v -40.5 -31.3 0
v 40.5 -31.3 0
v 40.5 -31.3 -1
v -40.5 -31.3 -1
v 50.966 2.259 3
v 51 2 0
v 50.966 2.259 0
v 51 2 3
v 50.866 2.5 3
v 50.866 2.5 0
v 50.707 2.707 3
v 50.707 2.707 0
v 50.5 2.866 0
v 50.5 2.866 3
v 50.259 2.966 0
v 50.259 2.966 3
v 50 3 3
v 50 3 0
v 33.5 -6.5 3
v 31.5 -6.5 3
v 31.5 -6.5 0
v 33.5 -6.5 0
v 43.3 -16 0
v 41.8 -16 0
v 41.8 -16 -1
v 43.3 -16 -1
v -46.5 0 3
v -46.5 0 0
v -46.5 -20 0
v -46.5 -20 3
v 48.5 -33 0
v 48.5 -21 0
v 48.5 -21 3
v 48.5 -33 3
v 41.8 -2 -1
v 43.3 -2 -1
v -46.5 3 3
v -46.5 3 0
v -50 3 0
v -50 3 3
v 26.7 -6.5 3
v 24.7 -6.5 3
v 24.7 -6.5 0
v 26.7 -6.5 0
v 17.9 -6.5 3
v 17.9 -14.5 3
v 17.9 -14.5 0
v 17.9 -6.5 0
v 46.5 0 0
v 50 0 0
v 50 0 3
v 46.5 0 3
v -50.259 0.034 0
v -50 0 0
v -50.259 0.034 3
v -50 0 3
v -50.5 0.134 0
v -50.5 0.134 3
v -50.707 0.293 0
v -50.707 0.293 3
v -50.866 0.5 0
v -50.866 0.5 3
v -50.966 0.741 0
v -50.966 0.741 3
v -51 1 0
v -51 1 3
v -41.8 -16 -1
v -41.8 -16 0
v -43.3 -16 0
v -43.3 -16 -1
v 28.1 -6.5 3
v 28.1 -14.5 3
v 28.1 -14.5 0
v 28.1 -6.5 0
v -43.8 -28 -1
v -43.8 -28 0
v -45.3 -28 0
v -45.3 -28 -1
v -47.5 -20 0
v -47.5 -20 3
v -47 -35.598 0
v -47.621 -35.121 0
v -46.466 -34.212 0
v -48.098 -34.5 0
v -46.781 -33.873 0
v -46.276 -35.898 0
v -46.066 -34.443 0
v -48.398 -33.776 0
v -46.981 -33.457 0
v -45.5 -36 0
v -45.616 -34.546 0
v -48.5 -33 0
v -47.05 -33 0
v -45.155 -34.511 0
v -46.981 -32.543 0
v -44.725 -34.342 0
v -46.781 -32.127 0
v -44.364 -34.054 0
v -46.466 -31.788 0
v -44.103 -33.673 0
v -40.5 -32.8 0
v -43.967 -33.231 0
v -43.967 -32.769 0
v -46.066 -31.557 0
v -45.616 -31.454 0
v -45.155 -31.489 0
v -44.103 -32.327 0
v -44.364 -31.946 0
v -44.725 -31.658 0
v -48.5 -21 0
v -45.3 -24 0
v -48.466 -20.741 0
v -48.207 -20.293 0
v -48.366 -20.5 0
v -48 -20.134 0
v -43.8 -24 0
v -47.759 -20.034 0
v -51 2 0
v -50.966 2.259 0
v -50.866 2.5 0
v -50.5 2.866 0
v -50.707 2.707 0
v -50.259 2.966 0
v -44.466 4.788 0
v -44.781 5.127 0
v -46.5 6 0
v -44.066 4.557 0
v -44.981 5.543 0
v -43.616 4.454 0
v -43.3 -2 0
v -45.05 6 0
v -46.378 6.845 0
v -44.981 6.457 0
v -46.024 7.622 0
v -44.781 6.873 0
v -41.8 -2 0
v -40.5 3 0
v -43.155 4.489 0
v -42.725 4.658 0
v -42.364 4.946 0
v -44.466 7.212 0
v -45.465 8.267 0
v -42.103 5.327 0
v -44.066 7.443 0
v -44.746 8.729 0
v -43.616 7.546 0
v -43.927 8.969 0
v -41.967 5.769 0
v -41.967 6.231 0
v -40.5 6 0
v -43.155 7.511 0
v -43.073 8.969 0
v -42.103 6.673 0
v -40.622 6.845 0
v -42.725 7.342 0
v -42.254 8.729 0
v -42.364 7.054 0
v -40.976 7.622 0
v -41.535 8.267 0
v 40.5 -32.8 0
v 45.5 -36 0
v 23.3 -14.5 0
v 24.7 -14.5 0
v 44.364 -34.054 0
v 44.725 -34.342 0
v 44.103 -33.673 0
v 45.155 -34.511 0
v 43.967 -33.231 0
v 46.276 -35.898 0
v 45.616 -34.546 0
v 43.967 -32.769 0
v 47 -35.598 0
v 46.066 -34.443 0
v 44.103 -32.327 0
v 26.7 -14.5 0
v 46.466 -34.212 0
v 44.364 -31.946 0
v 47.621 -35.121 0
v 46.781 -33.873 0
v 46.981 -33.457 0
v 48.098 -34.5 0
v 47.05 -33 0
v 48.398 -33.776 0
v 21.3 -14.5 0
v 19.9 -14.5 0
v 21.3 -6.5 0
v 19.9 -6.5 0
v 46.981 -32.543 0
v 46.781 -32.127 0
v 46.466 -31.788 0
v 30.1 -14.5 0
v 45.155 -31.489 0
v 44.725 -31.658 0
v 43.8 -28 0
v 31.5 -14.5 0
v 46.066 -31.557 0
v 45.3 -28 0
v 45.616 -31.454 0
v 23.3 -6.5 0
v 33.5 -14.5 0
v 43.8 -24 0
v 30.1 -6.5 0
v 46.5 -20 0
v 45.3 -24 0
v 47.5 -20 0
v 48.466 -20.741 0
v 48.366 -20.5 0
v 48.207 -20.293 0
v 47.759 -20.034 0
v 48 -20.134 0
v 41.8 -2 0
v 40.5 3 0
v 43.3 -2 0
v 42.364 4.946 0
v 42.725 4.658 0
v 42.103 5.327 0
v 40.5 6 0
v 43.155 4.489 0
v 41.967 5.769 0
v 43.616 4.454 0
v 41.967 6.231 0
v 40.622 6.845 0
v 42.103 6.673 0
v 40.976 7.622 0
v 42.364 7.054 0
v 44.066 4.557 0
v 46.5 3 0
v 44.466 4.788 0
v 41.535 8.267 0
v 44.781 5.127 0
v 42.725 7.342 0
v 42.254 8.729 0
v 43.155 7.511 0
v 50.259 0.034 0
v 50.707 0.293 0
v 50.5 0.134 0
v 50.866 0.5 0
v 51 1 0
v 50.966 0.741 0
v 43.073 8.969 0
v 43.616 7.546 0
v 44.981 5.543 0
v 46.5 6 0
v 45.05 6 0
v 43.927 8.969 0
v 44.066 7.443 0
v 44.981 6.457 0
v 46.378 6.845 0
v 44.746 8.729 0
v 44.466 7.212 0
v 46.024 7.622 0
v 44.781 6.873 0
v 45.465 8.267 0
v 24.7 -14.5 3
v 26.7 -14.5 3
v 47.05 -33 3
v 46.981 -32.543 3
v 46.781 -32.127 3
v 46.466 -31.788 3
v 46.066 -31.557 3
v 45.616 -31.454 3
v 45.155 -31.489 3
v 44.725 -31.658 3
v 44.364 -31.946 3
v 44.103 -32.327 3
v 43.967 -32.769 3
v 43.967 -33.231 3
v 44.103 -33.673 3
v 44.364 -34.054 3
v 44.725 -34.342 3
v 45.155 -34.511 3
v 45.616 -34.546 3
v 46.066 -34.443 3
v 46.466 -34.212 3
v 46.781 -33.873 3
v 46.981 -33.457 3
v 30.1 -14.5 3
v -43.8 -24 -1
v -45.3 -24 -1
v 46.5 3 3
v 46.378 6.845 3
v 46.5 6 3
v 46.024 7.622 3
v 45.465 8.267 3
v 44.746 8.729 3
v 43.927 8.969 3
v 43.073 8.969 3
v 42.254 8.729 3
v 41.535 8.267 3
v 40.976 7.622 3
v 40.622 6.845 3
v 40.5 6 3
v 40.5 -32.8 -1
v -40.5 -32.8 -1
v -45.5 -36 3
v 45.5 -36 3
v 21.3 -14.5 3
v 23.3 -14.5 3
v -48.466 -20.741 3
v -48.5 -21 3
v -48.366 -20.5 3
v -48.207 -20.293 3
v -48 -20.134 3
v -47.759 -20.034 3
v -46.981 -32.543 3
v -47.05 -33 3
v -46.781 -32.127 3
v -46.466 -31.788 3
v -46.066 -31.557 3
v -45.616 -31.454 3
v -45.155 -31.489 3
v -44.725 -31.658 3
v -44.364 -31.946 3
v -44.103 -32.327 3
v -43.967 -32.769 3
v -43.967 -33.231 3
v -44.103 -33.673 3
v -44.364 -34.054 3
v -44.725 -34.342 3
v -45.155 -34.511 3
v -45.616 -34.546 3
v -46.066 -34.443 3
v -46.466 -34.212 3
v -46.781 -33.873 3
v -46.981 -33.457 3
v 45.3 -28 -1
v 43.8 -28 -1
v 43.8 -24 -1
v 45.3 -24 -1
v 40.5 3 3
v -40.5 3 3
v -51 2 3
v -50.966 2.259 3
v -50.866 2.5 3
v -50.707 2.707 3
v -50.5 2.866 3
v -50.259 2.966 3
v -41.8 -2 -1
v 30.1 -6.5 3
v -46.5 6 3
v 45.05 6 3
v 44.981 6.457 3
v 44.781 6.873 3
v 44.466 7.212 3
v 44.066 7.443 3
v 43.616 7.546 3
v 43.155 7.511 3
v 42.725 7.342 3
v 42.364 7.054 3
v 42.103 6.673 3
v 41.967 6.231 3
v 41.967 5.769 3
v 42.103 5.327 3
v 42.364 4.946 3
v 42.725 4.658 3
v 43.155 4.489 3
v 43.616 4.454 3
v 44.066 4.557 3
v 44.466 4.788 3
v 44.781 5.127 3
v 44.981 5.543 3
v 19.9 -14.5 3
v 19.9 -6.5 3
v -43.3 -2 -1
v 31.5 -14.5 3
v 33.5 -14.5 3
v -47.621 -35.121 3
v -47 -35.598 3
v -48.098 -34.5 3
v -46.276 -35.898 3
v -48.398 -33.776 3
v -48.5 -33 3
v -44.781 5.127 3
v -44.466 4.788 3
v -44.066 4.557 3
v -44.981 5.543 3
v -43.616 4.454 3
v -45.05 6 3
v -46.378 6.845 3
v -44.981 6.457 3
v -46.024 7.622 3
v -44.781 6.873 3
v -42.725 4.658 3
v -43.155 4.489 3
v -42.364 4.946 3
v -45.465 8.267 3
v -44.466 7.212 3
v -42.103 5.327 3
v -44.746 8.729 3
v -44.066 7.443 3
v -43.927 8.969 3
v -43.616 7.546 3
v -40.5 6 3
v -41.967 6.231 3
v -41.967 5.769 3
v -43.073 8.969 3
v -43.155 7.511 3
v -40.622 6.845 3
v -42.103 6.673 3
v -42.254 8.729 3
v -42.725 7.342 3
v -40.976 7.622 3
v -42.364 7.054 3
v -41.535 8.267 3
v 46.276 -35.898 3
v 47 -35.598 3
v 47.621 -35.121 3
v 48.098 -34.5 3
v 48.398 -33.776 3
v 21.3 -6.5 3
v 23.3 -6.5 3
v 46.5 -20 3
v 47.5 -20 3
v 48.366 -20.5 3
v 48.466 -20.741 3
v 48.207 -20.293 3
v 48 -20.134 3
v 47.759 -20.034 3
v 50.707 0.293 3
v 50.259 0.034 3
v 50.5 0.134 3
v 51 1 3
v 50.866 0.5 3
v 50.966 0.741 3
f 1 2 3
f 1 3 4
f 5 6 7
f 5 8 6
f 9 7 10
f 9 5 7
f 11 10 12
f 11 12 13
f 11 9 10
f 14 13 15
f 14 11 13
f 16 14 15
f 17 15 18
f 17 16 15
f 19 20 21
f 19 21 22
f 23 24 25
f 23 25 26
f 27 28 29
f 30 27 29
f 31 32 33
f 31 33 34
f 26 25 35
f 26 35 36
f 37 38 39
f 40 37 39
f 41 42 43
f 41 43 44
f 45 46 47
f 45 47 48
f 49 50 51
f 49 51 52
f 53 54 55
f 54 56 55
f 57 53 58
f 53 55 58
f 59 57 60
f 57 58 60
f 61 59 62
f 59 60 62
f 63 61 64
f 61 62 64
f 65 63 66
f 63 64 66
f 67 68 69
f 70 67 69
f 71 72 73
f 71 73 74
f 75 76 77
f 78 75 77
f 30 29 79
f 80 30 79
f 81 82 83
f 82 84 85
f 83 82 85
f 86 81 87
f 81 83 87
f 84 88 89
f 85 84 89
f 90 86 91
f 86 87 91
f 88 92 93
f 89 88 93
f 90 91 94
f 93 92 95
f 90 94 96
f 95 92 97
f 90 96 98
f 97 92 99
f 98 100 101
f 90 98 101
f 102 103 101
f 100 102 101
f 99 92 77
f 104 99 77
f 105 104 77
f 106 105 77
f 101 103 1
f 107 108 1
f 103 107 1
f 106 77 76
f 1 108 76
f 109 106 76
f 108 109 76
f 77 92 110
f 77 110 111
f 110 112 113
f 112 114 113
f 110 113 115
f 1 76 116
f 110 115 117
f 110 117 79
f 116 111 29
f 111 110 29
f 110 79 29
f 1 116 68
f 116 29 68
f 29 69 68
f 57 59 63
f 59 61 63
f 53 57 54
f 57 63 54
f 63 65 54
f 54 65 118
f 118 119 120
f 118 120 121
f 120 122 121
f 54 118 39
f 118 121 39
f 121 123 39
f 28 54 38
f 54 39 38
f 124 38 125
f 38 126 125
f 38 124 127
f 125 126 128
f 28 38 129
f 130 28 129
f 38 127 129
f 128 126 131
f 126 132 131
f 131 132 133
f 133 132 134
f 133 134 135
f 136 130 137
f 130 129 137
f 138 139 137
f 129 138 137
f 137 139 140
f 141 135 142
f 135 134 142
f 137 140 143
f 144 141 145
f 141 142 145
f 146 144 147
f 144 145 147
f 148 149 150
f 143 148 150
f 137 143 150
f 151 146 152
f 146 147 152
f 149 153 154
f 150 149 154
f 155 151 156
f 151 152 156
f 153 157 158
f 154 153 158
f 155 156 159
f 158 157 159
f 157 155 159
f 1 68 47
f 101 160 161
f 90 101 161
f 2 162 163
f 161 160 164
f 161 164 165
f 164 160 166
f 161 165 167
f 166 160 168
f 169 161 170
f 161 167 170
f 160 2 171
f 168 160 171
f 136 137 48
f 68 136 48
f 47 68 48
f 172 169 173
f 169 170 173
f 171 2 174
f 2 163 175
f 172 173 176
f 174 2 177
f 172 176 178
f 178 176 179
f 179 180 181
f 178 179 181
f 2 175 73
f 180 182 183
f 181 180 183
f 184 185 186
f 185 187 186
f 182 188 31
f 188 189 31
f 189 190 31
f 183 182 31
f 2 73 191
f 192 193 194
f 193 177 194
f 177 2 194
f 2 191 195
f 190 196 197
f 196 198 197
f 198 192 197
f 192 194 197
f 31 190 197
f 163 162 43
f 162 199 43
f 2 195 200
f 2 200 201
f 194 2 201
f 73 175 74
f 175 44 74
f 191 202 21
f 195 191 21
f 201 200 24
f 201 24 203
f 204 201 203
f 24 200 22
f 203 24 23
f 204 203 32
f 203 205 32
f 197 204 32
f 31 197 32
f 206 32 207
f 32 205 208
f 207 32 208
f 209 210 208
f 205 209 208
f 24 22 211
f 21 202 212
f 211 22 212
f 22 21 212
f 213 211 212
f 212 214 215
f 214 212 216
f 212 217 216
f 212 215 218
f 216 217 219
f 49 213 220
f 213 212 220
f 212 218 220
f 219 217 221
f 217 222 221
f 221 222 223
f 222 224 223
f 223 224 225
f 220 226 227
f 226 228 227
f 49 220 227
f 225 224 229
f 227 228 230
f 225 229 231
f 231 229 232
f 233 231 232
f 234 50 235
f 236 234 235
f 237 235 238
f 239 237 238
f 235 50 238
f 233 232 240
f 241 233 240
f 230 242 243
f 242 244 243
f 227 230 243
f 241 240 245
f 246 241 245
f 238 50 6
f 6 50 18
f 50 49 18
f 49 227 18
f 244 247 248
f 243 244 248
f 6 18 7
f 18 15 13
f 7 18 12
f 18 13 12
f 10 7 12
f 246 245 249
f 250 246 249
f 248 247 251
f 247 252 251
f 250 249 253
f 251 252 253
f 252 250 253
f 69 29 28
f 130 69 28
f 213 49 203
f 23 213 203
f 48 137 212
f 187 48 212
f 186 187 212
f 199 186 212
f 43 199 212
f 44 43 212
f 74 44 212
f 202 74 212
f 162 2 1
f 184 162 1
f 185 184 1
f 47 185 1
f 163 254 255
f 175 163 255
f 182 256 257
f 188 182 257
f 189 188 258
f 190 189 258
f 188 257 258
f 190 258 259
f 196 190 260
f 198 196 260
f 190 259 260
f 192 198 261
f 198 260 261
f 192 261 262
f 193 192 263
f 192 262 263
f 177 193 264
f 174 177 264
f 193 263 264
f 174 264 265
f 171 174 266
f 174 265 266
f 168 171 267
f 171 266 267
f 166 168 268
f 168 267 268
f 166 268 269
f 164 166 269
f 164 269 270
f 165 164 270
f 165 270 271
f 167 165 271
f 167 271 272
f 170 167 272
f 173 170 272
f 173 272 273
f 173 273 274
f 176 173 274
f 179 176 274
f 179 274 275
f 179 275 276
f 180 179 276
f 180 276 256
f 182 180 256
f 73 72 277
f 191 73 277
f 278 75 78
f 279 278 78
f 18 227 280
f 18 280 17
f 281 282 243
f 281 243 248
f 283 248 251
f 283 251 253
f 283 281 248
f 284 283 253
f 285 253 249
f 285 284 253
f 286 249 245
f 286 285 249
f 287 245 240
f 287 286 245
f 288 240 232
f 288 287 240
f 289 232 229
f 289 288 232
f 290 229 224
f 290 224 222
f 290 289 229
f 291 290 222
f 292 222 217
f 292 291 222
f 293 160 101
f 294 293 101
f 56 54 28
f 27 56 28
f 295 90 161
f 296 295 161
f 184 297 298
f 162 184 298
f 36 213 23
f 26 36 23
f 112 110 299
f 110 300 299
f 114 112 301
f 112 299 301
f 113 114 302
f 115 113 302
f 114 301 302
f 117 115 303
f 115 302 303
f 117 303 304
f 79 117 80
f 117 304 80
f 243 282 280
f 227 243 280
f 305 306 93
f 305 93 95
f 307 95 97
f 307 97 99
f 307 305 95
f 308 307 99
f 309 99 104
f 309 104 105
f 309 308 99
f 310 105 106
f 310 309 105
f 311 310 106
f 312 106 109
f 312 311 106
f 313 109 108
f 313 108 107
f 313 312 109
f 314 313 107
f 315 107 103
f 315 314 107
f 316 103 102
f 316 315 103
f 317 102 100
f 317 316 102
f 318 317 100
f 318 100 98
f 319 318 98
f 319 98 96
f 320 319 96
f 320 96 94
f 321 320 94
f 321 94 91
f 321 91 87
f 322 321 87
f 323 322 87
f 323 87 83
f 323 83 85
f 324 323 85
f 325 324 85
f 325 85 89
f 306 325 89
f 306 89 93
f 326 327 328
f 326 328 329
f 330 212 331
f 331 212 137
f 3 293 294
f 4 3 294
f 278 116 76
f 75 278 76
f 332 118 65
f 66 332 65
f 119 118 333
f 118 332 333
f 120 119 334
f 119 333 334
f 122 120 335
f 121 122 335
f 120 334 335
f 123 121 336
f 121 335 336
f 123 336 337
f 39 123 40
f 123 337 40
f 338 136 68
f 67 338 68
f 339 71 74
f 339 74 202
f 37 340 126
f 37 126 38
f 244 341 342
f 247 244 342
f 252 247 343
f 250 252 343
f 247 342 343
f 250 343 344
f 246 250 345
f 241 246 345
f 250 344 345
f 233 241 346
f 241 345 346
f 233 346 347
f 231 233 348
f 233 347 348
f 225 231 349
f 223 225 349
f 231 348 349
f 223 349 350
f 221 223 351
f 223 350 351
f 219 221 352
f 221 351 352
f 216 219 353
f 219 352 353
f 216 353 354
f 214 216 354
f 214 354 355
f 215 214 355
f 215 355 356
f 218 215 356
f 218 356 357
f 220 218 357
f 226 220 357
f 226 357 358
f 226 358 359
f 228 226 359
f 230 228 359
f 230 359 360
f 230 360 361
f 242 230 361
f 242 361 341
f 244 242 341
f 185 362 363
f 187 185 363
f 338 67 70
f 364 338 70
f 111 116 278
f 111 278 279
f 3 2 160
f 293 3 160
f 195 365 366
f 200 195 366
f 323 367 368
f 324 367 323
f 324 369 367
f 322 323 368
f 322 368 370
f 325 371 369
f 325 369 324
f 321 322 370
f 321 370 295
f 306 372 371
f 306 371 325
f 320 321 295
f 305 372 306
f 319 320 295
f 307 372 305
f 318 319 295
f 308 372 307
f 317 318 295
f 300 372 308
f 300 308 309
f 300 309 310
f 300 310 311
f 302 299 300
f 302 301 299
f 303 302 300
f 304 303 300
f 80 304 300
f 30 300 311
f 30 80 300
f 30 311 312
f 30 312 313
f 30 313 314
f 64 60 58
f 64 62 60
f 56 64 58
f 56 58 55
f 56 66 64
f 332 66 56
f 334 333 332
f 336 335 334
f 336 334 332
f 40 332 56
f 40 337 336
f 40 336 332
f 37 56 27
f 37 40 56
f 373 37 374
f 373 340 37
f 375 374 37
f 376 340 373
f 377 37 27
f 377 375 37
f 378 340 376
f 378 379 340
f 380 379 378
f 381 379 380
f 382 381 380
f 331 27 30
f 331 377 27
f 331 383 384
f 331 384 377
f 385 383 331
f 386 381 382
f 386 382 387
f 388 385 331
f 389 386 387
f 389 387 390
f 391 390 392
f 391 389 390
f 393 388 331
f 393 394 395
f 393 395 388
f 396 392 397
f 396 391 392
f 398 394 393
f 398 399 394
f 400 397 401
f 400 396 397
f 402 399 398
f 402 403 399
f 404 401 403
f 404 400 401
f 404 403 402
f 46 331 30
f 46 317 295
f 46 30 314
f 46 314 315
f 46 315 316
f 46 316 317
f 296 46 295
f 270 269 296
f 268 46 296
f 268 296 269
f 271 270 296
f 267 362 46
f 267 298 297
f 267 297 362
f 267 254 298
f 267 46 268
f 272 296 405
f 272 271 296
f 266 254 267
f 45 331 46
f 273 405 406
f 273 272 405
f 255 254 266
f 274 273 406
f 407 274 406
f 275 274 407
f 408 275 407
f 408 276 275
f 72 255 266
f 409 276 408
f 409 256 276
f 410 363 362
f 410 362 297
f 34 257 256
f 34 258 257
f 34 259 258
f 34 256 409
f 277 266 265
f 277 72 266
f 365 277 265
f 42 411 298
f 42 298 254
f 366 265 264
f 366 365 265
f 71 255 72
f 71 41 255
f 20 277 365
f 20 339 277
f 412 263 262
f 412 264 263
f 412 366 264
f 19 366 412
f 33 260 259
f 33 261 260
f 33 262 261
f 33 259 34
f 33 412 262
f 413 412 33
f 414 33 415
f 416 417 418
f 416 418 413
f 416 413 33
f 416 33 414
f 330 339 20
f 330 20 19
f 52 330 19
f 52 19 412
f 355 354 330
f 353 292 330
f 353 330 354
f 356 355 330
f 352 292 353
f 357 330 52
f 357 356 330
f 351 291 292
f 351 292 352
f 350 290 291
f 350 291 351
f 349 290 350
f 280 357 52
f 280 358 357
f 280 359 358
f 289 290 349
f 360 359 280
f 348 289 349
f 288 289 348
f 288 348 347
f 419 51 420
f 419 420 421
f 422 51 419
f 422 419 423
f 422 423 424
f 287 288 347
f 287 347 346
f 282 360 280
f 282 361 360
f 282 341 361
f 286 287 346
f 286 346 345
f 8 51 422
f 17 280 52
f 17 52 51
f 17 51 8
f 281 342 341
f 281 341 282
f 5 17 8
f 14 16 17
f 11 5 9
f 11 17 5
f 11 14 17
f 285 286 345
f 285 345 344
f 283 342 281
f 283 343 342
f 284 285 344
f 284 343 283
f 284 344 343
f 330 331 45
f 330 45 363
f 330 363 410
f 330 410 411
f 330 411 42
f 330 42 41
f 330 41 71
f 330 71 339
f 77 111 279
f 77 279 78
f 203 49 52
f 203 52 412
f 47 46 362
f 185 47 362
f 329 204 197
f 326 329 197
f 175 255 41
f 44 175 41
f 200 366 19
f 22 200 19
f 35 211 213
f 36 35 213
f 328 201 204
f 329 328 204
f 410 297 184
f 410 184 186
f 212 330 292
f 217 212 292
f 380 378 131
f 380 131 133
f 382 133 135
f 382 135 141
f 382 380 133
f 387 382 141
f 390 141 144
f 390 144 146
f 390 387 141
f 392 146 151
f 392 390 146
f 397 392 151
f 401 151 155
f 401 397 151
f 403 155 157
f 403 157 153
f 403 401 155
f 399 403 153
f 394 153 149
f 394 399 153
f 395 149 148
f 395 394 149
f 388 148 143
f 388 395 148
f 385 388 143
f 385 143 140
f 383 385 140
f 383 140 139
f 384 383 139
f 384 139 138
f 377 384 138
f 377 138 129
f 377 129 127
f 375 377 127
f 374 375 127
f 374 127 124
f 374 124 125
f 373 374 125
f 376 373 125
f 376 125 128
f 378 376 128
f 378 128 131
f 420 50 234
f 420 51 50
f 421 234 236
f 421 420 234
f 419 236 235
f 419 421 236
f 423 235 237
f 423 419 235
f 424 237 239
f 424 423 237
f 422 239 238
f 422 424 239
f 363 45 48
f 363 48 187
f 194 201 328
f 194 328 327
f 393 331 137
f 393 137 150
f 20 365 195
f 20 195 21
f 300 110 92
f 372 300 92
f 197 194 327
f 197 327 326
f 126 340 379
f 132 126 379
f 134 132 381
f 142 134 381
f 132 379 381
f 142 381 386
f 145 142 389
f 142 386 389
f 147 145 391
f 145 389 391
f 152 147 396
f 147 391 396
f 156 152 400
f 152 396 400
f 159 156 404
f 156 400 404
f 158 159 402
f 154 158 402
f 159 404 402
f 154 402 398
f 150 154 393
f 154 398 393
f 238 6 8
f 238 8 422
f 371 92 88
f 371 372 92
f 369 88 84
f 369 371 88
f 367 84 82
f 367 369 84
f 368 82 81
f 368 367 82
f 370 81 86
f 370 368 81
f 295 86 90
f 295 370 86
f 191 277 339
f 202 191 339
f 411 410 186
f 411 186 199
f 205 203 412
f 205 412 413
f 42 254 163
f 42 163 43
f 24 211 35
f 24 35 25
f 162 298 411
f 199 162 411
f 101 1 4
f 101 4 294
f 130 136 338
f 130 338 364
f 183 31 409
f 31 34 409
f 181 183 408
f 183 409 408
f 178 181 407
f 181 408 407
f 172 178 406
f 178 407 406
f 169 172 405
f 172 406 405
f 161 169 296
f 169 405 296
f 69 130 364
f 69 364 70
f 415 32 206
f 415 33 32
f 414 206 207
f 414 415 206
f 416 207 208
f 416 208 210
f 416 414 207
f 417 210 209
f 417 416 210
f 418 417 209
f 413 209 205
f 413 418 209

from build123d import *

# Parameters (mm, degrees)
PAD_DEPTH           = 3
PAD001_DEPTH        = 3
FILLET_R            = 3
FILLET001_R         = 1
FILLET002_R         = 1
SKETCH003_W         = 1.5
SKETCH003_H         = 14
SKETCH003_H_2       = 4
SKETCH003_W_2       = 40.5
SKETCH003_H_3       = 1.5
PAD002_DEPTH        = 1
SKETCH005_R         = 1.55
POCKET001_DEPTH     = 5
SKETCH004_W         = 2
SKETCH004_H         = 8
POCKET_DEPTH        = 4.001
LINEARPATTERN_COUNT = 5
LINEARPATTERN_PITCH = 3.4


with BuildPart() as part:
    # Sketch → Pad (new body)
    with BuildSketch(Plane.XY):
        Polygon((0, 3), (51, 3), (51, 0), (46.5, 0), (46.5, -20), (48.5, -20), (48.5, -36), (0, -36), align=None)
    extrude(amount=PAD_DEPTH)

    # Sketch001 (on Face10 of Pad) → Pad001 (join)
    with BuildSketch(Plane.XY.offset(3)):
        with BuildLine():
            Line((46.5, 6), (46.5, 3))
            Line((46.5, 3), (40.5, 3))
            Line((40.5, 3), (40.5, 6))
            ThreePointArc((46.5, 6), (43.5, 9), (40.5, 6))
        make_face()
    extrude(amount=-PAD001_DEPTH)

    # Fillet
    fillet_edges = [part.edges().sort_by_distance(p)[0] for p in [
        (48.5, -36, 1.5),
    ]]
    fillet(fillet_edges, radius=FILLET_R)

    # Fillet001
    fillet001_edges = [part.edges().sort_by_distance(p)[0] for p in [
        (48.5, -20, 1.5),
    ]]
    fillet(fillet001_edges, radius=FILLET001_R)

    # Fillet002
    fillet002_edges = [part.edges().sort_by_distance(p)[0] for p in [
        (51, 3, 1.5),
        (51, 0, 1.5),
    ]]
    fillet(fillet002_edges, radius=FILLET002_R)

    # Sketch003 → Pad002 (join)
    with BuildSketch(Plane(origin=(0, 0, 0), x_dir=(1, 0, 0), z_dir=(0, 0, -1))):
        with Locations((42.55, 9)):
            Rectangle(SKETCH003_W, SKETCH003_H)
        with Locations((44.55, 26)):
            Rectangle(SKETCH003_W, SKETCH003_H_2)
        with Locations((20.25, 32.05)):
            Rectangle(SKETCH003_W_2, SKETCH003_H_3)
    extrude(amount=PAD002_DEPTH)

    # Sketch005 (on Face28 of Pad002) → Pocket001 (cut)
    with BuildSketch(Plane.XY.offset(3)):
        with Locations((43.5, 6)):
            Circle(SKETCH005_R)
        with Locations((45.5, -33)):
            Circle(SKETCH005_R)
    extrude(amount=-POCKET001_DEPTH, mode=Mode.SUBTRACT)

    # Mirrored: part across YZ


with BuildPart() as part_1:
    add(part.part)
    add(part.part.mirror(Plane.YZ))

    # Sketch004 (on Face58 of Mirrored) → Pocket (cut, through all)
    with BuildSketch(Plane.XY.offset(3)):
        with Locations((32.5, -10.5)):
            Rectangle(SKETCH004_W, SKETCH004_H)
    pocket = extrude(amount=-POCKET_DEPTH, mode=Mode.SUBTRACT)

    # LinearPattern: Pocket ×5
    with Locations(*[(-i * LINEARPATTERN_PITCH, 0, 0) for i in range(1, LINEARPATTERN_COUNT)]):
        add(pocket, mode=Mode.SUBTRACT)


solid = part_1.part
